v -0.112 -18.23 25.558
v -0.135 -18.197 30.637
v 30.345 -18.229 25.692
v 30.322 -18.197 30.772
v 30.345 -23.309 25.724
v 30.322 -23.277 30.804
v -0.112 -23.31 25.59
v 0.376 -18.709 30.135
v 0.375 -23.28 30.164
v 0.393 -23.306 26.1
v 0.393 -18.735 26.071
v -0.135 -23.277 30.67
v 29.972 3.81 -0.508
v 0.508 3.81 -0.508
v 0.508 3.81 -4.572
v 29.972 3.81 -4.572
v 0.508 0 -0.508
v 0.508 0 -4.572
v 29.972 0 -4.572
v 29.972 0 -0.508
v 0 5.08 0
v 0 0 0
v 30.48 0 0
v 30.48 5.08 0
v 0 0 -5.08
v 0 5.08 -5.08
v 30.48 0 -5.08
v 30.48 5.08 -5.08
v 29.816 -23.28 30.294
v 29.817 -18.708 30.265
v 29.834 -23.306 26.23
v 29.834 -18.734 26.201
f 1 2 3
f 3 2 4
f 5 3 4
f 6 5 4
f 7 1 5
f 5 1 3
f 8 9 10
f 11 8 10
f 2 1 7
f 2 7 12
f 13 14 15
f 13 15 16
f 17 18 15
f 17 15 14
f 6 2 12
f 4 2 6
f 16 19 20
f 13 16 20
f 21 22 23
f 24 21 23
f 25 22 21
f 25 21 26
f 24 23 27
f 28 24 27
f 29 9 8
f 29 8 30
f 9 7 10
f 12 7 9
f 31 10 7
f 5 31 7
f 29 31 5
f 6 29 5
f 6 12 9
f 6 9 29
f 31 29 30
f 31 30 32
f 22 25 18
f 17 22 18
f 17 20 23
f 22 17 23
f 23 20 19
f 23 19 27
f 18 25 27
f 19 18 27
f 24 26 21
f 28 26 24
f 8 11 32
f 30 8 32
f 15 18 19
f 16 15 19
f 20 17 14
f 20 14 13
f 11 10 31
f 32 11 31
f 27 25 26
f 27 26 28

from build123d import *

# Parameters (mm, degrees)
SKETCH1_W           = 30.48
SKETCH1_H           = 5.08
BOSS_EXTRUDE1_DEPTH = 5.08
SKETCH2_W           = 29.464
SKETCH2_H           = 4.064
CUT_EXTRUDE1_DEPTH  = 3.81
SKETCH4_W           = 30.457318312
SKETCH4_H           = 5.08
BOSS_EXTRUDE2_DEPTH = 5.08
SKETCH5_W           = 29.441318312
SKETCH5_H           = 4.064
CUT_EXTRUDE2_DEPTH  = 4.572


with BuildPart() as part:
    # Sketch1 → Boss-Extrude1 (new body)
    with BuildSketch(Plane(origin=(0, 0, 0), x_dir=(1, 0, 0), z_dir=(0, 1, 0))):
        with Locations((15.24, 2.54)):
            Rectangle(SKETCH1_W, SKETCH1_H)
    extrude(amount=BOSS_EXTRUDE1_DEPTH)

    # Sketch2 → Cut-Extrude1 (cut)
    with BuildSketch(Plane.XZ):
        with Locations((15.24, -2.54)):
            Rectangle(SKETCH2_W, SKETCH2_H)
    extrude(amount=-CUT_EXTRUDE1_DEPTH, mode=Mode.SUBTRACT)


with BuildPart() as body_2:
    # Sketch4 → Boss-Extrude2 (new body)
    with BuildSketch(Plane(origin=(-0.000214859, -18.392779658, 0.117809153), x_dir=(0.9999902906340888, 1.654365665117265e-05, 0.004406627265614342), z_dir=(-1.1681479151945916e-05, -0.9999794873667439, 0.0064050534179832894))):
        with Locations((15.228659156, 27.980530597)):
            Rectangle(SKETCH4_W, SKETCH4_H)
    extrude(amount=BOSS_EXTRUDE2_DEPTH)

    # Sketch5 → Cut-Extrude2 (cut)
    with BuildSketch(Plane(origin=(-0.000274201, -23.472675454, 0.150346824), x_dir=(0.999990290634089, 1.6543656651029003e-05, 0.004406627265591424), z_dir=(1.1681479151941708e-05, 0.9999794873667439, -0.006405053417983048))):
        with Locations((15.228659156, -27.980530597)):
            Rectangle(SKETCH5_W, SKETCH5_H)
    extrude(amount=CUT_EXTRUDE2_DEPTH, mode=Mode.SUBTRACT)


solid = Compound([part.part, body_2.part])
